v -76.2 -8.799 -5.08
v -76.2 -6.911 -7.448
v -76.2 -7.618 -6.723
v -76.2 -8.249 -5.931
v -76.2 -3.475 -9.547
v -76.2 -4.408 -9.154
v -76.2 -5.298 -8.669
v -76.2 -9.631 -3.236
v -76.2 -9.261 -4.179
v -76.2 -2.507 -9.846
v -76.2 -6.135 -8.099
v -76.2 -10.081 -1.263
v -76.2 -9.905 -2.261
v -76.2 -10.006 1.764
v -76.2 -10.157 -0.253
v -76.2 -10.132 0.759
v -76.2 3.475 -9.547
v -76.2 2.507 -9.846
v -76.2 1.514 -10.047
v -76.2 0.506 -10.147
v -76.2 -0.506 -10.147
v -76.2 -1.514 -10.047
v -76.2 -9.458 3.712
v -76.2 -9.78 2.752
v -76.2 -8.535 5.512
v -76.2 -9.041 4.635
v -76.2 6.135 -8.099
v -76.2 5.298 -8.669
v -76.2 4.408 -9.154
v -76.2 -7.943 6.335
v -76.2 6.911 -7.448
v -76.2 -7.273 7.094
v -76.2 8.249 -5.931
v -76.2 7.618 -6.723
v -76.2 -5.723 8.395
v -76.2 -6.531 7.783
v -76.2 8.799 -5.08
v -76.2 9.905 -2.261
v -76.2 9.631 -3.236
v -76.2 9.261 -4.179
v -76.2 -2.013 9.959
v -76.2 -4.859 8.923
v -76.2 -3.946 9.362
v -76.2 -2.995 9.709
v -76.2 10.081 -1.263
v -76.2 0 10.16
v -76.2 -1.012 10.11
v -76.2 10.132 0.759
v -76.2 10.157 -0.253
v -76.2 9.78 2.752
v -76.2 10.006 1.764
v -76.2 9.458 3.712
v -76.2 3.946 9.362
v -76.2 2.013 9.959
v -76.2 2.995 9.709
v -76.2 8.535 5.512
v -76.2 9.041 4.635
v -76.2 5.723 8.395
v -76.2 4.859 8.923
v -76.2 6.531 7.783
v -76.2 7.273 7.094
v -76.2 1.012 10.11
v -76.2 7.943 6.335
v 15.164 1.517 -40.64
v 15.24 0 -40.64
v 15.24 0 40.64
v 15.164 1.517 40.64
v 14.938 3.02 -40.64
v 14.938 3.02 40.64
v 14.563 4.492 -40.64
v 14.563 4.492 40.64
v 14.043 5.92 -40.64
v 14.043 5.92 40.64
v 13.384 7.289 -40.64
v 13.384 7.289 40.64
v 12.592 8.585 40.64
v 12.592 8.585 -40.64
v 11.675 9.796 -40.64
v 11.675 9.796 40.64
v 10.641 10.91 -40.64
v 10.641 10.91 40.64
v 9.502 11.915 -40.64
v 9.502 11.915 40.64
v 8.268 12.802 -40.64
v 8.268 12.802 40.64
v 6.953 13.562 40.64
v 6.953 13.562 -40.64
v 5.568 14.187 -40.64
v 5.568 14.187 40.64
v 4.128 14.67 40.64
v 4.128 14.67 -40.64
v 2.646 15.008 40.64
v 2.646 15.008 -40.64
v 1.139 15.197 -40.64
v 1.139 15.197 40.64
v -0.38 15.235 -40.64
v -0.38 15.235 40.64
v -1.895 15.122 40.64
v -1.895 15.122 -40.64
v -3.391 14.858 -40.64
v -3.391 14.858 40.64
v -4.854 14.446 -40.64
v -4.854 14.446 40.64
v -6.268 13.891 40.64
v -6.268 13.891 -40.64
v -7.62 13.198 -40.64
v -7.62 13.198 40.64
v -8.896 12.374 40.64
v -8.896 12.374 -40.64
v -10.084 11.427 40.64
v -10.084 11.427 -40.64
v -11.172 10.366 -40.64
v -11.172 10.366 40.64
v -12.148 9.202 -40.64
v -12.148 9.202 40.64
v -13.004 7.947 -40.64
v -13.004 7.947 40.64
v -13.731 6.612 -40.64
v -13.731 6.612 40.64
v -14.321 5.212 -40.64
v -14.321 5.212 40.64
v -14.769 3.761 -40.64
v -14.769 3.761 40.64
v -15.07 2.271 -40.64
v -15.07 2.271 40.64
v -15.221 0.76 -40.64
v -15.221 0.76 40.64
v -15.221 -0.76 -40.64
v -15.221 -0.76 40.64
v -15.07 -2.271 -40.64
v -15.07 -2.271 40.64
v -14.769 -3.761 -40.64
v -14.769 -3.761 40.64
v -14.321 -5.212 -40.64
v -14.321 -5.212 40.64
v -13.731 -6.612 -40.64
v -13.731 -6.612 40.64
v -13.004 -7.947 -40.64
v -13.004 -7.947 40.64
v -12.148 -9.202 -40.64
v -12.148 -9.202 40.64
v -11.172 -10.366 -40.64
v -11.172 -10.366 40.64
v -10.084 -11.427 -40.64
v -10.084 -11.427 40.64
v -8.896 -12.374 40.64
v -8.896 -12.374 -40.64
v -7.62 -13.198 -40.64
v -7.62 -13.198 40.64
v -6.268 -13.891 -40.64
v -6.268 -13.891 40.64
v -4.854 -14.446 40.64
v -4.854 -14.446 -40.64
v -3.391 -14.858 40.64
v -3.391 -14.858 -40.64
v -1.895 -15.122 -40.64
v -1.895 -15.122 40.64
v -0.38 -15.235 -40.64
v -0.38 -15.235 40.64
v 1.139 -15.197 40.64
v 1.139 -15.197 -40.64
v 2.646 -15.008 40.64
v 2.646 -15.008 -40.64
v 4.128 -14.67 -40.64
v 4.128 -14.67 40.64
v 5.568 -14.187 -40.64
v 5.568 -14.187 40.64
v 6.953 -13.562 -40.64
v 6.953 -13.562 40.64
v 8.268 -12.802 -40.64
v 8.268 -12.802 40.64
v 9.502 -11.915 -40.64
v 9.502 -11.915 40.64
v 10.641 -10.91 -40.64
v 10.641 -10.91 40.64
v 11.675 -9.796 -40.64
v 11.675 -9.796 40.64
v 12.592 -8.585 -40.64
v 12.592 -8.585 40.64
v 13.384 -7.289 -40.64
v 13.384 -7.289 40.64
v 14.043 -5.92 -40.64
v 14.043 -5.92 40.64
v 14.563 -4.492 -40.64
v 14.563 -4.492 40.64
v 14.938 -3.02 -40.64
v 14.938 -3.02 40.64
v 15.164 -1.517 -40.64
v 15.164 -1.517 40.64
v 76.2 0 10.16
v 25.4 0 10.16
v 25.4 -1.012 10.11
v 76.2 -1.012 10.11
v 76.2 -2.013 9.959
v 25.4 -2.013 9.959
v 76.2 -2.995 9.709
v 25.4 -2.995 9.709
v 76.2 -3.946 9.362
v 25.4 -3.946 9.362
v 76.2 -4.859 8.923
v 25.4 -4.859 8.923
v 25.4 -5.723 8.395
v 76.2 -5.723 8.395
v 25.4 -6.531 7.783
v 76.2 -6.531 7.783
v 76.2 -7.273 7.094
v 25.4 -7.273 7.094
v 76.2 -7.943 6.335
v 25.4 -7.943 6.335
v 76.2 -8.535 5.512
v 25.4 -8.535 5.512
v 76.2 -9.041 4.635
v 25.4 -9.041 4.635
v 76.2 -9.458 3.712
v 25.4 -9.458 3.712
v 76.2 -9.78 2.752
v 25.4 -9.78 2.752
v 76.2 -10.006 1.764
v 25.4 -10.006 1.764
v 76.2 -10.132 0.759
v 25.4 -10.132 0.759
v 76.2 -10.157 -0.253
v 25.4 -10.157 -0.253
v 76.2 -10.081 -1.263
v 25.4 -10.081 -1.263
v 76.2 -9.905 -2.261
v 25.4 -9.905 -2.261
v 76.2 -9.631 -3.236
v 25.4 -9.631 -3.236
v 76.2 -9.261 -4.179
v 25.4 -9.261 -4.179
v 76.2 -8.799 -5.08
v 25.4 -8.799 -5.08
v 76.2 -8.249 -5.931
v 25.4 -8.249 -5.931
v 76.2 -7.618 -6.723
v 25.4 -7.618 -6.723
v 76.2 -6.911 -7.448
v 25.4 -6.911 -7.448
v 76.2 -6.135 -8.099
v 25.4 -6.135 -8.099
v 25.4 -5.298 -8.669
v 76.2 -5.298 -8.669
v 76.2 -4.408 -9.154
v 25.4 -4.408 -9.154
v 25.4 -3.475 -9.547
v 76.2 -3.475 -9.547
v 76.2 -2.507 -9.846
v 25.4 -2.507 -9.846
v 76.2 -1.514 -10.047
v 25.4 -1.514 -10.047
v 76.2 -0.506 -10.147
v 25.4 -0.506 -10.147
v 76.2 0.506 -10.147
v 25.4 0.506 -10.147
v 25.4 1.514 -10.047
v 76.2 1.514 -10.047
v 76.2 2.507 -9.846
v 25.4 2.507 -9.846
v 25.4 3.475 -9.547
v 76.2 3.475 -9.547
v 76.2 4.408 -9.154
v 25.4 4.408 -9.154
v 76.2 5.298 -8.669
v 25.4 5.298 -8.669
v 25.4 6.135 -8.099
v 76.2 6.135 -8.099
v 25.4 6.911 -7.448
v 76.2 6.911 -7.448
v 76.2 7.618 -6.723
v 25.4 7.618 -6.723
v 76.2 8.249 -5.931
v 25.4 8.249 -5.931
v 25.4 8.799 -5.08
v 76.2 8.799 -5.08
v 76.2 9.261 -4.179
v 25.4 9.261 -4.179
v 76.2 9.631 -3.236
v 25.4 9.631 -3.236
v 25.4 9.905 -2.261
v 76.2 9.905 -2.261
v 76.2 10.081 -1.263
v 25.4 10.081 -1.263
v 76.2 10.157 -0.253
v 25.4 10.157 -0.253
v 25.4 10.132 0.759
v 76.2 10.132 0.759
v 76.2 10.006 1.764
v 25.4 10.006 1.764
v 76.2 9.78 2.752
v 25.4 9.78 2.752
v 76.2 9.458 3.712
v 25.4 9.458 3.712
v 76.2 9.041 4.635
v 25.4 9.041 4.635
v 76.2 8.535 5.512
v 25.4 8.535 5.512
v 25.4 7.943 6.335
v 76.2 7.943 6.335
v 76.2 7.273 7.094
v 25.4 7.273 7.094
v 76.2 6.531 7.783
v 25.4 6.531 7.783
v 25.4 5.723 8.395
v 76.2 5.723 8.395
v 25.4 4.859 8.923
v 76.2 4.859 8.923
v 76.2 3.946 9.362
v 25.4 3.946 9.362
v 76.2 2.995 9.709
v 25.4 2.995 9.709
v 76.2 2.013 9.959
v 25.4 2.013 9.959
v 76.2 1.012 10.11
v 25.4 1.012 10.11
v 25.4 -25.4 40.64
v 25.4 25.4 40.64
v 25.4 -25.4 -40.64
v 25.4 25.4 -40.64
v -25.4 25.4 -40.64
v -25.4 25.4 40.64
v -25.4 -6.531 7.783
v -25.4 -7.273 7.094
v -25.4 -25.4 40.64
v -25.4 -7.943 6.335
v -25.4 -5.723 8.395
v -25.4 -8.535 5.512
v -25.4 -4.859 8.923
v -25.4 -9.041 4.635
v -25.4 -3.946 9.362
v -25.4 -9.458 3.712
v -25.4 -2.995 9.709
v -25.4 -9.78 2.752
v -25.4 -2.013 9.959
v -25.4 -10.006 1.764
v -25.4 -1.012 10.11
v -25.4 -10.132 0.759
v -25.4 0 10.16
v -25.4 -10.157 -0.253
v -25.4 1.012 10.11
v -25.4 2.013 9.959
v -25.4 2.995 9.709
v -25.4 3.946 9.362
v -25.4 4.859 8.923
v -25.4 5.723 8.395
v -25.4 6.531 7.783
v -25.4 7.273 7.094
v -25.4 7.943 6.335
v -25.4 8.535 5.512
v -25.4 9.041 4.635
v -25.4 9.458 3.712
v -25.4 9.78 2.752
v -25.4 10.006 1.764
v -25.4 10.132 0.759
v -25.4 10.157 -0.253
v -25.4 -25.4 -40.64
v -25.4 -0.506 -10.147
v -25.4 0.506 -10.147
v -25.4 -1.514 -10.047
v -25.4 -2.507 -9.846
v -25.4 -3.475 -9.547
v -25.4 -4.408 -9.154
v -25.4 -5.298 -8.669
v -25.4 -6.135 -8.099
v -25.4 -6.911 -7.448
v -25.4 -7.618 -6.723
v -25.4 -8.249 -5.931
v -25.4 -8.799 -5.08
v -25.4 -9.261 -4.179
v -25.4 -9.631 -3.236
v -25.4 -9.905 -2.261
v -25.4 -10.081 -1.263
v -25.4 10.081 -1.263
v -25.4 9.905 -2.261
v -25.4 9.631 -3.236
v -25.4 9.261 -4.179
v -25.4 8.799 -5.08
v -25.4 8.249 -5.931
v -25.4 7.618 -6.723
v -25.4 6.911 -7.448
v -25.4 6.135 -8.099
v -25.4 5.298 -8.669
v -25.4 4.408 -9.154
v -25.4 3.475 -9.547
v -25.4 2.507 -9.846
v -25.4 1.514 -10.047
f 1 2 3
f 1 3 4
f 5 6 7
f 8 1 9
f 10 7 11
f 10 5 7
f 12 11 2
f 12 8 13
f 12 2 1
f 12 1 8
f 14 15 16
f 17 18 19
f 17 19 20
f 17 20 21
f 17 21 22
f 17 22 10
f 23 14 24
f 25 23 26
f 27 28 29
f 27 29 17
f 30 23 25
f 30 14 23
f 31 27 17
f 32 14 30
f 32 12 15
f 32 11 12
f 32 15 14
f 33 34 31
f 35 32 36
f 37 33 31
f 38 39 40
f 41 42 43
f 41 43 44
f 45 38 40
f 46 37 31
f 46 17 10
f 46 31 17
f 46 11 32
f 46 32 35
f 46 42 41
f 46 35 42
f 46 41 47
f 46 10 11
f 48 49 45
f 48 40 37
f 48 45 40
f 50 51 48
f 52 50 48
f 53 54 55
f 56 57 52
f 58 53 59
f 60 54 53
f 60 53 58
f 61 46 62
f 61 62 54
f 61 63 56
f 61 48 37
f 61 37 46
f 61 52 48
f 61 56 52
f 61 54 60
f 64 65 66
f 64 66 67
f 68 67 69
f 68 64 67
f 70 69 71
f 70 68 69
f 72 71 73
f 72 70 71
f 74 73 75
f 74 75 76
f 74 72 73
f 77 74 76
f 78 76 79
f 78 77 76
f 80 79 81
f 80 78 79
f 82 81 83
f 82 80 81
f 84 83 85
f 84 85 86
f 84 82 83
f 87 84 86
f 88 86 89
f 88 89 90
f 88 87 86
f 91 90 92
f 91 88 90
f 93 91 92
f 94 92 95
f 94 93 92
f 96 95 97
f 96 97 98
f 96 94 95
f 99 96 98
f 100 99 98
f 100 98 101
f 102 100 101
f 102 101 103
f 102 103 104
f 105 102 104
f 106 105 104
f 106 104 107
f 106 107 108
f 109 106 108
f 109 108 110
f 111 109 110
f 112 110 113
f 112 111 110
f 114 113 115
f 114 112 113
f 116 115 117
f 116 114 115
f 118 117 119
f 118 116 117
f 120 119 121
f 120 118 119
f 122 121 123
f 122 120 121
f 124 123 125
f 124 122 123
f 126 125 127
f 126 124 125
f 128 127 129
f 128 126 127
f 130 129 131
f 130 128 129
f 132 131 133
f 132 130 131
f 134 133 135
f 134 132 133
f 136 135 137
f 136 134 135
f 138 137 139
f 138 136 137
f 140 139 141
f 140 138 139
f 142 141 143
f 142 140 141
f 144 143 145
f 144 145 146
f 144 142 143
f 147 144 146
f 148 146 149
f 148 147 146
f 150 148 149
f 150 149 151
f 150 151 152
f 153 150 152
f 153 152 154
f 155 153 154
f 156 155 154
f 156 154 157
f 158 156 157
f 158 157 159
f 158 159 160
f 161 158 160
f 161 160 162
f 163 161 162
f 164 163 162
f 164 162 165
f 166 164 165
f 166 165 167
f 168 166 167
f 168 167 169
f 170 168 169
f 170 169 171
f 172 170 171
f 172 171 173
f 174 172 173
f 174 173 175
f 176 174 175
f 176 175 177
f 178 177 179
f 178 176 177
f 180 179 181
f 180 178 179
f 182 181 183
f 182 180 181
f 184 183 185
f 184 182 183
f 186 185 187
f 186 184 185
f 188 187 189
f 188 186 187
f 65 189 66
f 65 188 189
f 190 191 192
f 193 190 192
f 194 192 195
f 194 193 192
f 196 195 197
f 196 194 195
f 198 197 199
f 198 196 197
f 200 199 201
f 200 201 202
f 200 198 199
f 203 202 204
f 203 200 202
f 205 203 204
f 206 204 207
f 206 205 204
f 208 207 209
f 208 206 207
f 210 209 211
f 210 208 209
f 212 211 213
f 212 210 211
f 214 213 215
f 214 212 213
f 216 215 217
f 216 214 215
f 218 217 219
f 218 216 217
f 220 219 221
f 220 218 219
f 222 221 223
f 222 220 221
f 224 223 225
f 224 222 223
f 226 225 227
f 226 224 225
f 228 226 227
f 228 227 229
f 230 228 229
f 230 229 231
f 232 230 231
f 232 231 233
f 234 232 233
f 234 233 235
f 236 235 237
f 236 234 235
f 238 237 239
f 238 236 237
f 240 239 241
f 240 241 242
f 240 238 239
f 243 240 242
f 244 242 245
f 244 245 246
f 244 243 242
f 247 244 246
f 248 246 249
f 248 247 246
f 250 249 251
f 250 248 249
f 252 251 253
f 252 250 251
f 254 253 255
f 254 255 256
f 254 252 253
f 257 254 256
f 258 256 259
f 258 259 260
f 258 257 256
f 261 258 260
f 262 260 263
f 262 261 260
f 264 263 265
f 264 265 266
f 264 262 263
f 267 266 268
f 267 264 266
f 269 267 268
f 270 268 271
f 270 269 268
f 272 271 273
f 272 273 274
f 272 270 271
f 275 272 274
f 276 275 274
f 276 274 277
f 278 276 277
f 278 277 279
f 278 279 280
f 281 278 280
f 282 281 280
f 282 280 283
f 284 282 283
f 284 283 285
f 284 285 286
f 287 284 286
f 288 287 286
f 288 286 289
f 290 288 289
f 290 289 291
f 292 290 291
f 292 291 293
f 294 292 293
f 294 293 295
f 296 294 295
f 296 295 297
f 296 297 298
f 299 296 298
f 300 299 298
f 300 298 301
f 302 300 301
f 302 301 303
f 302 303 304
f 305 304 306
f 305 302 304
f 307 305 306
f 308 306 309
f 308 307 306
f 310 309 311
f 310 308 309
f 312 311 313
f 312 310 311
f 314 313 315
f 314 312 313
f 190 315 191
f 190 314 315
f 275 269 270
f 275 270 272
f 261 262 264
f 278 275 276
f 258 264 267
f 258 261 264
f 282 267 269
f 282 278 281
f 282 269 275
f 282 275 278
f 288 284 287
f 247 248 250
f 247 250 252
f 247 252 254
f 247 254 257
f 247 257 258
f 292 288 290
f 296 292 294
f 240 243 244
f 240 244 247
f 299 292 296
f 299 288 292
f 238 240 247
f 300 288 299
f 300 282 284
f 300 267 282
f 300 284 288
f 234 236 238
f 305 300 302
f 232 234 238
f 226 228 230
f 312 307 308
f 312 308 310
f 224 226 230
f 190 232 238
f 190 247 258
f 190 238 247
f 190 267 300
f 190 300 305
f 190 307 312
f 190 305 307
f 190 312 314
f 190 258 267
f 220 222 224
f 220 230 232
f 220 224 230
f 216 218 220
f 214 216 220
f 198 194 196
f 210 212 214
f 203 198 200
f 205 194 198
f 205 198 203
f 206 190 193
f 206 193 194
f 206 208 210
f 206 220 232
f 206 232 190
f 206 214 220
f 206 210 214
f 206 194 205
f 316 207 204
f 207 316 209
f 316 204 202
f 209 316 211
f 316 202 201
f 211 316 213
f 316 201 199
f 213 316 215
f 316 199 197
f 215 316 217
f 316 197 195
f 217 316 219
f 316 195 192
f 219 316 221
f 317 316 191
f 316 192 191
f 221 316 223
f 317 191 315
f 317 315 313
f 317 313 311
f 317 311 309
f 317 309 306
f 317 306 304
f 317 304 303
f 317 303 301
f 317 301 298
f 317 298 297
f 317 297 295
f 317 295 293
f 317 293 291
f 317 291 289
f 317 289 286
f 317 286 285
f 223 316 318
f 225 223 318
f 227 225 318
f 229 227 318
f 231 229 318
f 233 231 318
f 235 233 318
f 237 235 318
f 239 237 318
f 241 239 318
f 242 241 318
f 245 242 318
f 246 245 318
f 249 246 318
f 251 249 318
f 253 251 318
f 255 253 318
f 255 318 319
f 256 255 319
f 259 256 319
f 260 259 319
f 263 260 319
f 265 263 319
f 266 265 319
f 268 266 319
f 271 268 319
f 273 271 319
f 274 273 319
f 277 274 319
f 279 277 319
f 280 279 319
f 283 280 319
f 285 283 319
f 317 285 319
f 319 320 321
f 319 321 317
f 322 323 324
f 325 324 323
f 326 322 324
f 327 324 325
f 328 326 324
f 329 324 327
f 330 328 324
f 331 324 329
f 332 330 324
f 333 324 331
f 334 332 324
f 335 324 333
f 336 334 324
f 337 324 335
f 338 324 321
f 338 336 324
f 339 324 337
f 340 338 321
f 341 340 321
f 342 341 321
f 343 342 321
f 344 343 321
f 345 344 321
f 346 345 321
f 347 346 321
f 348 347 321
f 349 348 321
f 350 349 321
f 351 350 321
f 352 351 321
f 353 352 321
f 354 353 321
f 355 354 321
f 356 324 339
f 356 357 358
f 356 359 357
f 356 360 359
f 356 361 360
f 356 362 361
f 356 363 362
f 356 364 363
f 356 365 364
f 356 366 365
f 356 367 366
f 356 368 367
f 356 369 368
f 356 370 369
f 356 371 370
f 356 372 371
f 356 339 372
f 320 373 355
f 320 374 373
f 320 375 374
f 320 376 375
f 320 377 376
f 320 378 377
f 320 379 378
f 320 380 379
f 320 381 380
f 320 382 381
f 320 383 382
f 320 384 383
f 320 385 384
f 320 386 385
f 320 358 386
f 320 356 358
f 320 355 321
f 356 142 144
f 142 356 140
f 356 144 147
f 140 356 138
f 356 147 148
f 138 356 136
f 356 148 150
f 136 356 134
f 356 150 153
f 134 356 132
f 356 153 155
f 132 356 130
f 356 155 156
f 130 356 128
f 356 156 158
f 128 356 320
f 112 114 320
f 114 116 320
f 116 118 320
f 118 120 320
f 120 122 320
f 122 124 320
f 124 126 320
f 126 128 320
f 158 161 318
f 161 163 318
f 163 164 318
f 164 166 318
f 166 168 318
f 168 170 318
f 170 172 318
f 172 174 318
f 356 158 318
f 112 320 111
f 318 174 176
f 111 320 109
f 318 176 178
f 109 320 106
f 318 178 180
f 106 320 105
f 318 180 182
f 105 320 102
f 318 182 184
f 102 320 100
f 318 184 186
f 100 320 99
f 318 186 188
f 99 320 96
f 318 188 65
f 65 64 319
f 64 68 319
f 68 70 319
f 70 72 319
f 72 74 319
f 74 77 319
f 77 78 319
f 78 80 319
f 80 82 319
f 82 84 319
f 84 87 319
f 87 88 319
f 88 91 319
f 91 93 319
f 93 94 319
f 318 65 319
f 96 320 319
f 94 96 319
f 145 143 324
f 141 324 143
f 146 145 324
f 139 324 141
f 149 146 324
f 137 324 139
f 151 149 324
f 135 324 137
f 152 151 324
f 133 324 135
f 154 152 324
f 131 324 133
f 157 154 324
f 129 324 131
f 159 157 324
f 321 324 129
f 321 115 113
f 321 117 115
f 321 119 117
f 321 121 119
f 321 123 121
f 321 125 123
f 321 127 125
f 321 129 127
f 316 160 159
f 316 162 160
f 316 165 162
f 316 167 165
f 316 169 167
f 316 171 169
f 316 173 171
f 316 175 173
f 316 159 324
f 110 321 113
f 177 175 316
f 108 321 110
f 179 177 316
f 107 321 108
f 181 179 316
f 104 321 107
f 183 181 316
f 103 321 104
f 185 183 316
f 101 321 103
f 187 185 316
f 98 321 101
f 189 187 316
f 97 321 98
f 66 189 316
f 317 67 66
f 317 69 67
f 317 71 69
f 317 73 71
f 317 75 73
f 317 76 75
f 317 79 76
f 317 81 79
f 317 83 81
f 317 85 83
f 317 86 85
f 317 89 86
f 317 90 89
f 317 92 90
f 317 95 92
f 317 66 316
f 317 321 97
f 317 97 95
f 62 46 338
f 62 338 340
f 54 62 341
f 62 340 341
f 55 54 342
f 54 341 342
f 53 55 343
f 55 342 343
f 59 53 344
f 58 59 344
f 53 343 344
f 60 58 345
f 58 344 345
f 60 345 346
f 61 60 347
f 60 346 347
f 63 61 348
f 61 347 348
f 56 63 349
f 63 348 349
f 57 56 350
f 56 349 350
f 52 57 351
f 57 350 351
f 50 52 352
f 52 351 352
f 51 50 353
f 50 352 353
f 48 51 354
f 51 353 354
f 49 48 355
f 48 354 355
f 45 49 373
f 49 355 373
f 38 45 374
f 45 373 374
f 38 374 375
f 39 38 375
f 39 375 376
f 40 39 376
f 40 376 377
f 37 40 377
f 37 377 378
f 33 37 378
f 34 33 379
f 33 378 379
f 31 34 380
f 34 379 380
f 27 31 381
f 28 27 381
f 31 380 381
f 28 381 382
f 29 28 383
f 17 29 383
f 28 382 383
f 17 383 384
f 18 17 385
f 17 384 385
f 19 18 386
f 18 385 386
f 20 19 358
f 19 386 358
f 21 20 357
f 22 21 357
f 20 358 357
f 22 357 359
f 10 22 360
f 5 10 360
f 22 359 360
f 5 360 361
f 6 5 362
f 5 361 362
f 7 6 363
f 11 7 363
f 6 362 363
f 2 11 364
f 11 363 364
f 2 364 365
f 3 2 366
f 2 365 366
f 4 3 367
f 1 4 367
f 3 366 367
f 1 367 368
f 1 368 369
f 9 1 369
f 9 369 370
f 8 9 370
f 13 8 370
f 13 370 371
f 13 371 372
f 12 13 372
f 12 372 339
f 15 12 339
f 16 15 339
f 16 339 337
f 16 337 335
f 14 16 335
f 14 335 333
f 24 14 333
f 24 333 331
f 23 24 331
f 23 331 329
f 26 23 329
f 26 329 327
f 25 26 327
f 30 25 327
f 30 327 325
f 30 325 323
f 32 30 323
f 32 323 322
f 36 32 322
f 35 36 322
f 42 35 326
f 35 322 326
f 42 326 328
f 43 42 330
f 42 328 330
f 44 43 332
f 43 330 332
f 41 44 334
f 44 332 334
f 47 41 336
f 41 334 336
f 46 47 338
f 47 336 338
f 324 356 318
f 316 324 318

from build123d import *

# Parameters (mm, degrees)
BOSS_EXTRUDE1_DEPTH      = 5.08
BOSS_EXTRUDE1_DEPTH_BACK = 5.08
SKETCH1_W                = 6.35
SKETCH1_H                = 6.35
SKETCH1_R                = 1.905
SKETCH2_R                = 1.27
BOSS_EXTRUDE2_DEPTH      = 6.35
BOSS_EXTRUDE3_START      = 6.35
SKETCH3_R                = 1.27
BOSS_EXTRUDE3_DEPTH      = 6.35
SCALE1_SCALE             = 8


with BuildPart() as part:
    # Sketch1 → Boss-Extrude1 (new, two sides: drawn at the far end of the back side and taken through both)
    with BuildSketch(Plane.XY.offset(-BOSS_EXTRUDE1_DEPTH_BACK)):
        Rectangle(SKETCH1_W, SKETCH1_H)
        Circle(SKETCH1_R, mode=Mode.SUBTRACT)
    extrude(amount=BOSS_EXTRUDE1_DEPTH + BOSS_EXTRUDE1_DEPTH_BACK)

    # Sketch2 → Boss-Extrude2 (add)
    with BuildSketch(Plane.ZY.offset(3.175)):
        Circle(SKETCH2_R)
    extrude(amount=BOSS_EXTRUDE2_DEPTH)

    # Sketch3 → Boss-Extrude3 (add)
    with BuildSketch(Plane(origin=(3.175, 0, 0), x_dir=(0, 0, -1), z_dir=(1, 0, 0)).offset(BOSS_EXTRUDE3_START)):
        Circle(SKETCH3_R)
    extrude(amount=-BOSS_EXTRUDE3_DEPTH)


with BuildPart() as part_1:
    # Scale1: scaled about (0, 0, 0)
    add(part.part.scale(SCALE1_SCALE))


solid = part_1.part
